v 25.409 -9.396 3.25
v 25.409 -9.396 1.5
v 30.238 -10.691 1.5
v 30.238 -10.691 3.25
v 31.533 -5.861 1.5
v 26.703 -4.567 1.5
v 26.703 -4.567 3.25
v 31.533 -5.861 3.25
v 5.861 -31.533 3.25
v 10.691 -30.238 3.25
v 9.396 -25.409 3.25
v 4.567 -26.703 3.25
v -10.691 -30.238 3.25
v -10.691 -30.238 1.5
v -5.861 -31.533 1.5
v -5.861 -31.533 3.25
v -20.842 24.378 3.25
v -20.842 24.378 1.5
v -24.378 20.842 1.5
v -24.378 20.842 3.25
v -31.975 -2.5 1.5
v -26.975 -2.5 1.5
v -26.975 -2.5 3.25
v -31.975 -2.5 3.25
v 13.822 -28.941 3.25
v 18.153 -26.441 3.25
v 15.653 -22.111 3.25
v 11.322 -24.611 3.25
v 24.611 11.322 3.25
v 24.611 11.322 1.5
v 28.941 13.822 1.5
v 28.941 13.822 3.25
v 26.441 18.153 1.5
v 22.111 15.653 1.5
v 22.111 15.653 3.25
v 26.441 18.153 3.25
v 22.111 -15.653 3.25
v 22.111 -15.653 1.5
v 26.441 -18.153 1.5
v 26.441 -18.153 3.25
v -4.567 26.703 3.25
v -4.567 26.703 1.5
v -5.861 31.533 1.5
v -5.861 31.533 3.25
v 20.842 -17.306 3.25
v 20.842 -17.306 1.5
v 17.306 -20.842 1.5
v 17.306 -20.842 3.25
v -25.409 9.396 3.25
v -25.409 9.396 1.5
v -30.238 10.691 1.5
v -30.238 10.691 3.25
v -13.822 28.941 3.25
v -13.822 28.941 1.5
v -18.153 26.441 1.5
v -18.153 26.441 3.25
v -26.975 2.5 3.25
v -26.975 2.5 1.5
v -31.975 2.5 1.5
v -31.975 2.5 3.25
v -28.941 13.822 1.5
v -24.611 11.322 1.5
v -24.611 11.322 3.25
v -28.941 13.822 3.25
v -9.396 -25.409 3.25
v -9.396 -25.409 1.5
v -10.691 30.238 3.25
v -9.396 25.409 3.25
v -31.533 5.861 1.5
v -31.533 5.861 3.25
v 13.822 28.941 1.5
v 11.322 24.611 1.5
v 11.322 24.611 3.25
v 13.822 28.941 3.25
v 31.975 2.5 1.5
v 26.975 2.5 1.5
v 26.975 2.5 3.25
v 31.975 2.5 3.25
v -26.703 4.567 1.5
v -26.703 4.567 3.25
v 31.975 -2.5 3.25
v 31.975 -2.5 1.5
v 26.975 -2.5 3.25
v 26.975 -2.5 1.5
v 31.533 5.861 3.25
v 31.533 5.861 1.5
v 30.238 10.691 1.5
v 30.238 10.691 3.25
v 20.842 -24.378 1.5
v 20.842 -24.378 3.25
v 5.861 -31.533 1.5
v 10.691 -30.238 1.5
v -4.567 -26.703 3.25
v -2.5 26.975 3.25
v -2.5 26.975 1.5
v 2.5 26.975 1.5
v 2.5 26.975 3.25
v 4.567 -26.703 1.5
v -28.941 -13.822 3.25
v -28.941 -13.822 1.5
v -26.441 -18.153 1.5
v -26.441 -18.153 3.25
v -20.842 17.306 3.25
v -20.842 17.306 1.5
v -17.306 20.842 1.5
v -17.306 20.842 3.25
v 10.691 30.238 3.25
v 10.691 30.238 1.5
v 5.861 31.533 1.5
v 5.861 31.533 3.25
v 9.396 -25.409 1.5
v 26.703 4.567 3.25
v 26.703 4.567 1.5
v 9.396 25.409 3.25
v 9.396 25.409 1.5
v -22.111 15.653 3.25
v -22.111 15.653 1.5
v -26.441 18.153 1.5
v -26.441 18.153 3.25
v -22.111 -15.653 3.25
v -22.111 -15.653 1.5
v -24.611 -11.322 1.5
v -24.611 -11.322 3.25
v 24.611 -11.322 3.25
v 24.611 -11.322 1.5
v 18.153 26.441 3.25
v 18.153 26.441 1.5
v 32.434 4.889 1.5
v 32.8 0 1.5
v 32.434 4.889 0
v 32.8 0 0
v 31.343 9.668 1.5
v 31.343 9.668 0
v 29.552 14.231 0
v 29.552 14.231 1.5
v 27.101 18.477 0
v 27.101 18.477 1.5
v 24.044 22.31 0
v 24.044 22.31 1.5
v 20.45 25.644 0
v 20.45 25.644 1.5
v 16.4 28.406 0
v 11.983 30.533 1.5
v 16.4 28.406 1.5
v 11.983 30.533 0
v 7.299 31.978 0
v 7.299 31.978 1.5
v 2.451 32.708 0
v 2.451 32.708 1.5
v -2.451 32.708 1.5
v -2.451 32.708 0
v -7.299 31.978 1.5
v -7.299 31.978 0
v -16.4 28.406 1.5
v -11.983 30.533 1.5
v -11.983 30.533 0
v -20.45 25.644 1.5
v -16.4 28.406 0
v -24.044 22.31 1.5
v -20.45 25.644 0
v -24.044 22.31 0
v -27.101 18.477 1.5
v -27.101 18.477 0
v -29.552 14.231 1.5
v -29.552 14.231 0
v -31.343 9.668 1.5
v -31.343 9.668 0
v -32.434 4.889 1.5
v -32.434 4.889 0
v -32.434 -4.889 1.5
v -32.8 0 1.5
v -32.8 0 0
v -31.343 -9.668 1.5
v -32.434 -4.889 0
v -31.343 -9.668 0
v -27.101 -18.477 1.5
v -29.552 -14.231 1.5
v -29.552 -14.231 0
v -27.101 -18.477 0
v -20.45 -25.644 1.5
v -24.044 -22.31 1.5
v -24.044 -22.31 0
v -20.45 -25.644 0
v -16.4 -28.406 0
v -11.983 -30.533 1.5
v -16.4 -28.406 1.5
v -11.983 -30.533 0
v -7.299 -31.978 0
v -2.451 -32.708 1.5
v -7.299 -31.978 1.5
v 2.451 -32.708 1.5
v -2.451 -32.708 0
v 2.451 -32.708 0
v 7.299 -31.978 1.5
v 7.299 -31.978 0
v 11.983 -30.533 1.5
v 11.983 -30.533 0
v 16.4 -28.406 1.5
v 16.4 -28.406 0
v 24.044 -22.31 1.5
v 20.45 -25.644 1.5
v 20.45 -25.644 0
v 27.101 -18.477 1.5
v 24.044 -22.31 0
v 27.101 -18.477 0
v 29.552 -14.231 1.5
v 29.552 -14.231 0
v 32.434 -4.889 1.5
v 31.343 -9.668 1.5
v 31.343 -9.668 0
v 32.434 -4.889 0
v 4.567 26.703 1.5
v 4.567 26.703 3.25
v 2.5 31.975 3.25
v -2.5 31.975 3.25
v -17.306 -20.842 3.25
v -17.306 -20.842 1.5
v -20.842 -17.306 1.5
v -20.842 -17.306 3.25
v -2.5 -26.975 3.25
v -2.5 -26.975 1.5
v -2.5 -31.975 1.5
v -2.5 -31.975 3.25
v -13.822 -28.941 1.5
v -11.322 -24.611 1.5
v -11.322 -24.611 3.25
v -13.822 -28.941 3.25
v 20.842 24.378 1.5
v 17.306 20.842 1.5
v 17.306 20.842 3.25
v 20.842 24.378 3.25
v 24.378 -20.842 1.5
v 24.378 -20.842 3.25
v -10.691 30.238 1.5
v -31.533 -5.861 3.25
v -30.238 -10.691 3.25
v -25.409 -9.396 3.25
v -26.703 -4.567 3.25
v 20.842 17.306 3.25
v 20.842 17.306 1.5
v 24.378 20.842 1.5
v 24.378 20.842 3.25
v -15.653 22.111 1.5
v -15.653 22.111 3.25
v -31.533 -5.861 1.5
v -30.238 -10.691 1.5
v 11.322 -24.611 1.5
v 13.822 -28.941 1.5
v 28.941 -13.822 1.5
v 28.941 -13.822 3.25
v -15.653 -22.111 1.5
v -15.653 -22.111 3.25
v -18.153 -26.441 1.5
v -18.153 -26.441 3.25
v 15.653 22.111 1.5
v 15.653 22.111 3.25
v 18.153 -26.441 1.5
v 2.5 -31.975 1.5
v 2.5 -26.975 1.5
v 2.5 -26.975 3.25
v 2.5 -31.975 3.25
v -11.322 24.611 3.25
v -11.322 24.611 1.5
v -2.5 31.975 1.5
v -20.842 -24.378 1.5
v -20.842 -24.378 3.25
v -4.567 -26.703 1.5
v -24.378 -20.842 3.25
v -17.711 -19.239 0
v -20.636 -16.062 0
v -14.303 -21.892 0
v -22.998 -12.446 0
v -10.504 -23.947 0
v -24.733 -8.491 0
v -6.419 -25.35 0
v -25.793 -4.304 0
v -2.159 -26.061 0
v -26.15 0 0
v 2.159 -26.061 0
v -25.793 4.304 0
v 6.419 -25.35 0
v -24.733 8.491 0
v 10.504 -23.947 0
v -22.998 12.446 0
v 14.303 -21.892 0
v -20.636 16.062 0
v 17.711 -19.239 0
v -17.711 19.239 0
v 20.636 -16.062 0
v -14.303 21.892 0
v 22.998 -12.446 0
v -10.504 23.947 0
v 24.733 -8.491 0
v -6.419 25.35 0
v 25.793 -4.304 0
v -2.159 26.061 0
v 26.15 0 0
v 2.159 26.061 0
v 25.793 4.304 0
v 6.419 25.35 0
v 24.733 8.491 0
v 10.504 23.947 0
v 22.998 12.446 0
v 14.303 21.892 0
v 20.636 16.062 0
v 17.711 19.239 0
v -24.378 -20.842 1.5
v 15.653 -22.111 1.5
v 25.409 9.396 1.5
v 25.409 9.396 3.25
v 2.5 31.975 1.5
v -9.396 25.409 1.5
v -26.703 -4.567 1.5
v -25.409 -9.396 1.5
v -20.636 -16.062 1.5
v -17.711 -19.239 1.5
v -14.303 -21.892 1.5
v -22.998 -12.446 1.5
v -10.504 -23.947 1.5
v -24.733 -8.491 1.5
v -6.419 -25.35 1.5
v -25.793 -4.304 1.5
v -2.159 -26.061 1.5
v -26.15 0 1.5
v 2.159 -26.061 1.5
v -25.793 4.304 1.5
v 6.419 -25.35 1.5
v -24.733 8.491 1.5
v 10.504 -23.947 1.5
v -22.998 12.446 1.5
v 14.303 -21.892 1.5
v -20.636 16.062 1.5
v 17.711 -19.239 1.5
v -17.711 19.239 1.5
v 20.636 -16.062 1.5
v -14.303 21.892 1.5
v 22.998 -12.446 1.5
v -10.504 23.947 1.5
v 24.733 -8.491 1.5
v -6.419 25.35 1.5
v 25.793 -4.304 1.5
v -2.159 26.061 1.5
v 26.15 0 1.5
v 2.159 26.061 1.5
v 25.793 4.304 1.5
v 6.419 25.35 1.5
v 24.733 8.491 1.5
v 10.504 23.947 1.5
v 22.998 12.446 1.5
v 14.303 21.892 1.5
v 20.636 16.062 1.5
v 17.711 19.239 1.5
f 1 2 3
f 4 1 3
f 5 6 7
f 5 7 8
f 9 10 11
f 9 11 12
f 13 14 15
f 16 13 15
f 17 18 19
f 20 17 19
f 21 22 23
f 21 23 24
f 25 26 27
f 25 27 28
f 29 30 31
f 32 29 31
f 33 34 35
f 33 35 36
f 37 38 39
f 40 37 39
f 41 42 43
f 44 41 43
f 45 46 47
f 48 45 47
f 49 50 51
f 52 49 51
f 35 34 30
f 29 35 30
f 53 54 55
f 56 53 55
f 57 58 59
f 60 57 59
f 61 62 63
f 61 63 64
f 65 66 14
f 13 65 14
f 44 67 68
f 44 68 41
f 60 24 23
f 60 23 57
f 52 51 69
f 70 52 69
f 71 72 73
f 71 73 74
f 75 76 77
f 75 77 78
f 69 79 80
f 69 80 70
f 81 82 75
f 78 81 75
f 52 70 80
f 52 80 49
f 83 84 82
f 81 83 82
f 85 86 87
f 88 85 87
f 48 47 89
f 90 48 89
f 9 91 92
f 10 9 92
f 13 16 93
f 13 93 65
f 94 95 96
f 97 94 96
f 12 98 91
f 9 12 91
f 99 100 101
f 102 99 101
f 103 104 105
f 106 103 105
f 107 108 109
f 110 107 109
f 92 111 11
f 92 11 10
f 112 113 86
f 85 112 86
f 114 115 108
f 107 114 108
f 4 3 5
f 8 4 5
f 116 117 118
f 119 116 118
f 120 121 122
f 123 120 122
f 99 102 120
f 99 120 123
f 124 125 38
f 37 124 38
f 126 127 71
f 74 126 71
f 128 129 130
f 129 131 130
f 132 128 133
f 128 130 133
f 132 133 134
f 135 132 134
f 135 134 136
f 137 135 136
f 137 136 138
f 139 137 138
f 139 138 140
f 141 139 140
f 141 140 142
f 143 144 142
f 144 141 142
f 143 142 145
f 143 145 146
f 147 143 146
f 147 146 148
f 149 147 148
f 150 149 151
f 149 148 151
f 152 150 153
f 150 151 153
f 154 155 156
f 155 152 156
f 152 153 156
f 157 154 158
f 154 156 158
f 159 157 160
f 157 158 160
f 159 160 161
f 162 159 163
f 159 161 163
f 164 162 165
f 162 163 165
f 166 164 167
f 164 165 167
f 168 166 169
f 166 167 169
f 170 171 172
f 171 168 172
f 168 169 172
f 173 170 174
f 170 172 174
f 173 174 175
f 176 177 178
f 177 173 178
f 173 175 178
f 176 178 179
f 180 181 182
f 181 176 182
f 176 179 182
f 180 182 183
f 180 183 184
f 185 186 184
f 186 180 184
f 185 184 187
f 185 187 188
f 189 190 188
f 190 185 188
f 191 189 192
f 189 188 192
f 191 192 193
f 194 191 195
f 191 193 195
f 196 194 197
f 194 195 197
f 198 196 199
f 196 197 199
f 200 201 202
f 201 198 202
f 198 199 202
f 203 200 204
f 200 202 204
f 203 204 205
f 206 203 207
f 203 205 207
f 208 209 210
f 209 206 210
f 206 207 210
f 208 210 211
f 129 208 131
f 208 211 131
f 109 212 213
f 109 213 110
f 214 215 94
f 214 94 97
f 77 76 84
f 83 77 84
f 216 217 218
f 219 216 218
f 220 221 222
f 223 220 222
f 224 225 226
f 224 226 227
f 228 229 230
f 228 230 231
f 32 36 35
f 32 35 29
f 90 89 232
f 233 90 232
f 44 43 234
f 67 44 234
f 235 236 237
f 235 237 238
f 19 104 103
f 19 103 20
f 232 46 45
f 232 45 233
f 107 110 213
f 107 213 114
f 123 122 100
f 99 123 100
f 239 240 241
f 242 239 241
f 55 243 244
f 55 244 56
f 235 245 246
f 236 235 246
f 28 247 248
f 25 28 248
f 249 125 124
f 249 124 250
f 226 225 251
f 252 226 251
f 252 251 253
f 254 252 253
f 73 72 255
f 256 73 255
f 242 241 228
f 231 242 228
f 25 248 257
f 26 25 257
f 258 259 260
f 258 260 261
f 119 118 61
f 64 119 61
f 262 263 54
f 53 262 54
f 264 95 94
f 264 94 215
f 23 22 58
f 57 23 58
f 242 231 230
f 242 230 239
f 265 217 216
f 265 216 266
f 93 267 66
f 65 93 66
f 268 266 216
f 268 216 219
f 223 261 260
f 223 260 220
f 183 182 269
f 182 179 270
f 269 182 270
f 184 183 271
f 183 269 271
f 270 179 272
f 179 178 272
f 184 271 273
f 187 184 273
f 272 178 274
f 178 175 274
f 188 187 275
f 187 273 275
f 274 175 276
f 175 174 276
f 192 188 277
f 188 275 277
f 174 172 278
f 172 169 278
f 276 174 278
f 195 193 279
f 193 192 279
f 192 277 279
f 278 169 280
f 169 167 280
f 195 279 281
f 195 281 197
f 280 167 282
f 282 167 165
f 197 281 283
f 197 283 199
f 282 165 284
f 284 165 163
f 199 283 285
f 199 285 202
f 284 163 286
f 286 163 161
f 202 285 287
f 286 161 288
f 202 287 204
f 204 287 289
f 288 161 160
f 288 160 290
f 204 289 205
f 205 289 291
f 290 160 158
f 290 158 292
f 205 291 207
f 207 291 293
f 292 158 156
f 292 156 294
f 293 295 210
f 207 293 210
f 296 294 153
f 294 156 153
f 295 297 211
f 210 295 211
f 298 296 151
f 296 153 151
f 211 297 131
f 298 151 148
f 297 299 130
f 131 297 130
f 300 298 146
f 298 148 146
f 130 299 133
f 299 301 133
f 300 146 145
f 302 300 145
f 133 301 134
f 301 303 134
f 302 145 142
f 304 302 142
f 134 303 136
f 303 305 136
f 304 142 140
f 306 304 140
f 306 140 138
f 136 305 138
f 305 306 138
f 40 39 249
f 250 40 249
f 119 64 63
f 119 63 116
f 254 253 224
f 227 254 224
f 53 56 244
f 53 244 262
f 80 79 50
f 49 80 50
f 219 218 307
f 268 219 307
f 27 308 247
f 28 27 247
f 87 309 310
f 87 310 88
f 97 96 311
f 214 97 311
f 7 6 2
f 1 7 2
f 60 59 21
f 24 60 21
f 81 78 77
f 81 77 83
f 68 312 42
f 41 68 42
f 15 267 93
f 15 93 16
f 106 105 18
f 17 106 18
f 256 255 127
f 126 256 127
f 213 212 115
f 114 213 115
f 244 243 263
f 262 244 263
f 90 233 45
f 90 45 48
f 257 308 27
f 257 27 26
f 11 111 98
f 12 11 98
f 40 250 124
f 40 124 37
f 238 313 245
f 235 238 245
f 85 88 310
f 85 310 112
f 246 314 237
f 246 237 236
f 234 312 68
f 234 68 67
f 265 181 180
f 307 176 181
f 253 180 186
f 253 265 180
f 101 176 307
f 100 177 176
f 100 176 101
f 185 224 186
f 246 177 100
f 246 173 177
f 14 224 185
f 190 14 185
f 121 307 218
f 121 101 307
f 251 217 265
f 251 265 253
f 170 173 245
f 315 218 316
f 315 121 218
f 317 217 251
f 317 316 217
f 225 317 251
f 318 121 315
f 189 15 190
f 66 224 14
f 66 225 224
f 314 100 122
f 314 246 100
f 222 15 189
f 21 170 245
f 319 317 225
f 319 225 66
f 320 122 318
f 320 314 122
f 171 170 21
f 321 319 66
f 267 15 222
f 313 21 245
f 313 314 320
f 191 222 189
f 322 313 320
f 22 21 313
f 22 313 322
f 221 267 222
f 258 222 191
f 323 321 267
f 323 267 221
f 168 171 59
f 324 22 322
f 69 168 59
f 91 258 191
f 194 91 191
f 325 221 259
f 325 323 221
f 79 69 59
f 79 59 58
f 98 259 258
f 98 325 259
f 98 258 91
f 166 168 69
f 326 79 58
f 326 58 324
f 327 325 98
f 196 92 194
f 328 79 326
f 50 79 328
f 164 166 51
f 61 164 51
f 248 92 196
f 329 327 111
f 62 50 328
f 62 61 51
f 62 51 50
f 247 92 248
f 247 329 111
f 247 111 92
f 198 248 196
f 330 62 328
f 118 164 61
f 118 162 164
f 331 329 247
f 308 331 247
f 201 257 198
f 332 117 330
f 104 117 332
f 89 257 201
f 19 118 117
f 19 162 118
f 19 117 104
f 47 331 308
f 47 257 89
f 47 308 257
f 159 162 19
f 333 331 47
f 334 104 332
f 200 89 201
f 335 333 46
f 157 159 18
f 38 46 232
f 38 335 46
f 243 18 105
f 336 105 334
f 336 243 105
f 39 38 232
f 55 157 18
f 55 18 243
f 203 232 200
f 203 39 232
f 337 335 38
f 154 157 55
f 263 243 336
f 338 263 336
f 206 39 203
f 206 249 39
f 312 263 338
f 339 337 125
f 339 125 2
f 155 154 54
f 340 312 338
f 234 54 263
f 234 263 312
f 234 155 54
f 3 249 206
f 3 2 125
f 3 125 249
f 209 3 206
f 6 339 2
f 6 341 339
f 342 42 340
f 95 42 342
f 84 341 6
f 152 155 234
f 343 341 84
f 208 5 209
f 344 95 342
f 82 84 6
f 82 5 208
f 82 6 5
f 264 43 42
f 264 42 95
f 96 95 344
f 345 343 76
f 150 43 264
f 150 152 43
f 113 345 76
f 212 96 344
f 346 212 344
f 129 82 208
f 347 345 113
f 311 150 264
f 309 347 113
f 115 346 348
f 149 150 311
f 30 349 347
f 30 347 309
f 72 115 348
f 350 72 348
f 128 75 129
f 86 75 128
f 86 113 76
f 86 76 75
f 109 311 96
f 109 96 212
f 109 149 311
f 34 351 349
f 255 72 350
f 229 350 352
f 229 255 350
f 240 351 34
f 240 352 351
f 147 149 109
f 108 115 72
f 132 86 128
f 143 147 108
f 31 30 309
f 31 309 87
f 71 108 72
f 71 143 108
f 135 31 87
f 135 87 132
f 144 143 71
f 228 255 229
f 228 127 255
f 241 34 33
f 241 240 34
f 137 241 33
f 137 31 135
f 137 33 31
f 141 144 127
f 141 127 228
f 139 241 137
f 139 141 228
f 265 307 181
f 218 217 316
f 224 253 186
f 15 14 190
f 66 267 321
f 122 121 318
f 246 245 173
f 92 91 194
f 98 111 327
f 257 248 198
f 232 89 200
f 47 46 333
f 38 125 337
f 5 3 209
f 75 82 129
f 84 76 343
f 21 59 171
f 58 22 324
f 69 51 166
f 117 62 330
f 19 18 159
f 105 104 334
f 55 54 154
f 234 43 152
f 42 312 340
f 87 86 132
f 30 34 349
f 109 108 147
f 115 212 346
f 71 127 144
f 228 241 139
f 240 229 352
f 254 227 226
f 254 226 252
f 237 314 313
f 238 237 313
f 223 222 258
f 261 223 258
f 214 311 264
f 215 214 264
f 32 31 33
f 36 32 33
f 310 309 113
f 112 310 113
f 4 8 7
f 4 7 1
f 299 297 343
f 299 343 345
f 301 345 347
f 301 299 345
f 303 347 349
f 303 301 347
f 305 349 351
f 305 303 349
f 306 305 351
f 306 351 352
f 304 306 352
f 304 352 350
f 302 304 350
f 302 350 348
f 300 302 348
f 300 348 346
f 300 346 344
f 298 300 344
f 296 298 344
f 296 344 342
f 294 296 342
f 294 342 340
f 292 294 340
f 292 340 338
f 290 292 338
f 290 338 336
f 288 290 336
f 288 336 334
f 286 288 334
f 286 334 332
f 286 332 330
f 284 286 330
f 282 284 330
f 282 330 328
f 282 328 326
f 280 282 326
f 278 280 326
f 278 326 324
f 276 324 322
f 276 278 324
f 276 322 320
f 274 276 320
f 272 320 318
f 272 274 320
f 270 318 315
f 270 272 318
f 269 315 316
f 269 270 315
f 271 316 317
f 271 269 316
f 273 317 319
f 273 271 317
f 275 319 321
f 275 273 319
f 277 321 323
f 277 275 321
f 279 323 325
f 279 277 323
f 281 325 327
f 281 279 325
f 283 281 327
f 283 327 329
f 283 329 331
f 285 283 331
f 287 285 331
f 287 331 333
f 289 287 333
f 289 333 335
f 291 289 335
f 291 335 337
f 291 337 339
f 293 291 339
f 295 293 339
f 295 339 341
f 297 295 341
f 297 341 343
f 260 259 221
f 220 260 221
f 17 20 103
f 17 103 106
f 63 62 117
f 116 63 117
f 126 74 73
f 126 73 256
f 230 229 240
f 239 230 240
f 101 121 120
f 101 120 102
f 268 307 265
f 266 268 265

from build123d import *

# Parameters (mm, degrees)
F0_R     = 32.8
F0_R_2   = 26.15
F2_DEPTH = 1.5
F1_W     = 2.5
F1_H     = 5
F3_DEPTH = 3.25
F4_COUNT = 24


with BuildPart() as f2:
    # F0 (on Top) → F2 (new body)
    with BuildSketch(Plane.XY):
        Circle(F0_R)
        Circle(F0_R_2, mode=Mode.SUBTRACT)
    extrude(amount=F2_DEPTH)

    # F1 (on Top) → F3 (join)
    with BuildSketch(Plane.XY):
        with Locations((-1.25, 29.475)):
            Rectangle(F1_W, F1_H)
        with Locations((1.25, 29.475)):
            Rectangle(F1_W, F1_H)
    extrude(amount=F3_DEPTH)

    # F4: F2 ×24 about axis
    f4_axis = Axis((0, 0, 0), (0, 0, 1))


with BuildPart() as f2_1:
    add(f2.part)
    for i in range(1, F4_COUNT):
        add(f2.part.rotate(f4_axis, i * 360 / F4_COUNT))


solid = f2_1.part
